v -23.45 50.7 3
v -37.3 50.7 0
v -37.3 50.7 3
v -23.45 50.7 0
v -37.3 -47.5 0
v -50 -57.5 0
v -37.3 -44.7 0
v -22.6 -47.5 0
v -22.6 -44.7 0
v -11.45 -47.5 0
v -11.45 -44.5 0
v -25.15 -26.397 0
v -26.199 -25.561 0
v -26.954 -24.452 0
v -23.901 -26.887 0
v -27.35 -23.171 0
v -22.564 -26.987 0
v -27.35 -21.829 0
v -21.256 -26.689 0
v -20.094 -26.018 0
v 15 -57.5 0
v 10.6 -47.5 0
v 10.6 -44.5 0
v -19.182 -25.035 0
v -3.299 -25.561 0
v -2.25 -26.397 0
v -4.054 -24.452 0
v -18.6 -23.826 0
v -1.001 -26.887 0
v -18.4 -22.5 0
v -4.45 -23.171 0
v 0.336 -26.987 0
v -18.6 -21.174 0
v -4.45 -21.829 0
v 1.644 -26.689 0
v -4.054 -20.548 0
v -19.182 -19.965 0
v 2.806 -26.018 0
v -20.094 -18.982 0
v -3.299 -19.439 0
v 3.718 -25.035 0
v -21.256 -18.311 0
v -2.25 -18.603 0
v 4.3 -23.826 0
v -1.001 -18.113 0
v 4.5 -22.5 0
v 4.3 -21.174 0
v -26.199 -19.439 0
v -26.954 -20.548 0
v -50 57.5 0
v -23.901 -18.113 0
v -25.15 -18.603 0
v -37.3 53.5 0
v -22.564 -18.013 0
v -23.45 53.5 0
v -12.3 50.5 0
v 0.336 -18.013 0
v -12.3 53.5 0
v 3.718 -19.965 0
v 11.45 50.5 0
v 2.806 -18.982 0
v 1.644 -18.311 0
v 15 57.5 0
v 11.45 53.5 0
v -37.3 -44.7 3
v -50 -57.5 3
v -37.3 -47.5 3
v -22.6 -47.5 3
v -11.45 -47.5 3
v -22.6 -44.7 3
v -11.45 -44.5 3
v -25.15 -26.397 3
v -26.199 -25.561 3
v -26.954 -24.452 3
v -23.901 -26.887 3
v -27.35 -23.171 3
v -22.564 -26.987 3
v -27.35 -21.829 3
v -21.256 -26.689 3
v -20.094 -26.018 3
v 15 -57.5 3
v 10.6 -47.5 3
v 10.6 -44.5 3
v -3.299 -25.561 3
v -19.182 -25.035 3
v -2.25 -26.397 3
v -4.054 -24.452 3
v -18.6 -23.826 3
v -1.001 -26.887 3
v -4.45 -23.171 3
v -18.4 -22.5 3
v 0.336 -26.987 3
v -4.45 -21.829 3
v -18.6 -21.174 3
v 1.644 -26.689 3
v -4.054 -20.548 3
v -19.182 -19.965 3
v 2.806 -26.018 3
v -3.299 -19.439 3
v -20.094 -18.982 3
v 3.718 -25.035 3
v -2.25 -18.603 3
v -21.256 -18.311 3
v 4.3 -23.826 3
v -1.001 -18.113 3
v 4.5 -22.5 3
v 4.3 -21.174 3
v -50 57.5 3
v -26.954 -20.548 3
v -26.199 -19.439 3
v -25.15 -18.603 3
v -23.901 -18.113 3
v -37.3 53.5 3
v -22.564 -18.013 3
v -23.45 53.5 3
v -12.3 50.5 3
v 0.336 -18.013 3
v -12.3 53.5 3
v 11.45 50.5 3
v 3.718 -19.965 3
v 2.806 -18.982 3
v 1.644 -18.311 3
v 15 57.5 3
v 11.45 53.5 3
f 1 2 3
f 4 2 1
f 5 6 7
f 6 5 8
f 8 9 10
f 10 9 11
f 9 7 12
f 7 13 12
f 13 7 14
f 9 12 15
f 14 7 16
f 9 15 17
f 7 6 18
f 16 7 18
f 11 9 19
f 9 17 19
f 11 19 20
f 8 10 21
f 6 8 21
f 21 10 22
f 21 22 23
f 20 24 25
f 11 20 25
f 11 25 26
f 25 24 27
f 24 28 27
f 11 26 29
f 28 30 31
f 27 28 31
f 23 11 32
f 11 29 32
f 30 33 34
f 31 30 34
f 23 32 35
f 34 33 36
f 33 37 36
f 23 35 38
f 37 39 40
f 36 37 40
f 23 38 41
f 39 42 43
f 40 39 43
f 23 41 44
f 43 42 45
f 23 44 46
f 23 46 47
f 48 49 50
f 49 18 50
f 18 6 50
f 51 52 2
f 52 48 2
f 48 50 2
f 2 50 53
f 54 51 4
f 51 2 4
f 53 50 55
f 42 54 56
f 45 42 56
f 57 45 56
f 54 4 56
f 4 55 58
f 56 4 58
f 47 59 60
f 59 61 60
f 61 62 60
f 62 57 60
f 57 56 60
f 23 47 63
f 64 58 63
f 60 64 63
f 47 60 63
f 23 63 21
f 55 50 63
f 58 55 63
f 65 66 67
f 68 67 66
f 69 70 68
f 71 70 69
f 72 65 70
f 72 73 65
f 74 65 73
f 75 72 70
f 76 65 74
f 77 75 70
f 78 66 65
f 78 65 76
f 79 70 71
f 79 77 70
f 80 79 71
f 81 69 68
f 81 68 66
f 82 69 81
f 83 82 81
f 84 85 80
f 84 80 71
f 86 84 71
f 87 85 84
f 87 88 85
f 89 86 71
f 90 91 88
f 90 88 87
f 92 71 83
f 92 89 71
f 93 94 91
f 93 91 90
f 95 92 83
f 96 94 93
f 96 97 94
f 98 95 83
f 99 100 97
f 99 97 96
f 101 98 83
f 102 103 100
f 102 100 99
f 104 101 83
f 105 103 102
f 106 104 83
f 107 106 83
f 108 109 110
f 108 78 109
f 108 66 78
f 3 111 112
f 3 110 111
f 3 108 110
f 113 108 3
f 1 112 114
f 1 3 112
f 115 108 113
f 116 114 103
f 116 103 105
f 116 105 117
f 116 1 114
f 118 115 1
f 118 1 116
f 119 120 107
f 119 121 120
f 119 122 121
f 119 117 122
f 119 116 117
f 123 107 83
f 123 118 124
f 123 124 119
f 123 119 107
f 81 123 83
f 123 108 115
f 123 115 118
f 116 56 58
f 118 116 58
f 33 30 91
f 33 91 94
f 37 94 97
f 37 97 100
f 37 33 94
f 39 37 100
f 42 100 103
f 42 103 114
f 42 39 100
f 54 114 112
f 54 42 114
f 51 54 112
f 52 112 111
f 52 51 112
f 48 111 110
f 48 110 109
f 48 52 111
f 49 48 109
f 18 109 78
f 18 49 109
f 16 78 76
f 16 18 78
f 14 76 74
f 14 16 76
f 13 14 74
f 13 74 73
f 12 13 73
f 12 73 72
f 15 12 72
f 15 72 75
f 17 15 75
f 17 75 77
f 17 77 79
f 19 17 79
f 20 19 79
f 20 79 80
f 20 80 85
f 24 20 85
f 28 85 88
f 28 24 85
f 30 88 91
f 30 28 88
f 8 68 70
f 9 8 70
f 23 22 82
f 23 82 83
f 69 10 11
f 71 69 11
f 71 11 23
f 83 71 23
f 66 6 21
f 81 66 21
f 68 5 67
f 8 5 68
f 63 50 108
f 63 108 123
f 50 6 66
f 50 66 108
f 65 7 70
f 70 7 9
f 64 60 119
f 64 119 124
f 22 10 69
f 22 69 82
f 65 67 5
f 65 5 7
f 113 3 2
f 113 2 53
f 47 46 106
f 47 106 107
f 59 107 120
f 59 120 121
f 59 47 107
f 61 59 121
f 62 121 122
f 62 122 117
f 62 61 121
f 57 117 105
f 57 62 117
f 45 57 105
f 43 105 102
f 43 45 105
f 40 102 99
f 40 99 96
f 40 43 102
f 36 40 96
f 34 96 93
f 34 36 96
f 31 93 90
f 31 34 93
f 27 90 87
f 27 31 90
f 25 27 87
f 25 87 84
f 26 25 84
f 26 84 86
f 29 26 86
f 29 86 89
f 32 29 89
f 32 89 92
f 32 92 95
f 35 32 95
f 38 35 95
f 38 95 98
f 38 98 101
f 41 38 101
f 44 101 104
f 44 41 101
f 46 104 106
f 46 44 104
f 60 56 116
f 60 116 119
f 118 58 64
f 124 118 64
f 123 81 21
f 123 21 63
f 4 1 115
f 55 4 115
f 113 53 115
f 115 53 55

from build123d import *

# Parameters (mm, degrees)
CROQUIS1_W              = 100
CROQUIS1_H              = 115
CROQUIS1_R              = 4.5
CROQUIS1_W_2            = 14.7
CROQUIS1_H_2            = 2.8
CROQUIS1_W_3            = 22.05
CROQUIS1_H_3            = 3
CROQUIS1_W_4            = 13.85
CROQUIS1_W_5            = 23.75
SALIENTE_EXTRUIR1_DEPTH = 3
CROQUIS2_W              = 35
CROQUIS2_H              = 115
CORTAR_EXTRUIR1_DEPTH   = 4


with BuildPart() as part:
    # Croquis1 → Saliente-Extruir1 (new body)
    with BuildSketch(Plane.XY):
        Rectangle(CROQUIS1_W, CROQUIS1_H)
        with Locations((0, -22.5)):
            Circle(CROQUIS1_R, mode=Mode.SUBTRACT)
        with Locations((-22.9, -22.5)):
            Circle(CROQUIS1_R, mode=Mode.SUBTRACT)
        with Locations((24.1, -22.5)):
            Circle(CROQUIS1_R, mode=Mode.SUBTRACT)
        with Locations((29.95, -46.1)):
            Rectangle(CROQUIS1_W_2, CROQUIS1_H_2, mode=Mode.SUBTRACT)
        with Locations((-29.95, -46.1)):
            Rectangle(CROQUIS1_W_2, CROQUIS1_H_2, mode=Mode.SUBTRACT)
        with Locations((-0.425, -46)):
            Rectangle(CROQUIS1_W_3, CROQUIS1_H_3, mode=Mode.SUBTRACT)
        with Locations((30.375, 52.1)):
            Rectangle(CROQUIS1_W_4, CROQUIS1_H_2, mode=Mode.SUBTRACT)
        with Locations((-30.375, 52.1)):
            Rectangle(CROQUIS1_W_4, CROQUIS1_H_2, mode=Mode.SUBTRACT)
        with Locations((-0.425, 52)):
            Rectangle(CROQUIS1_W_5, CROQUIS1_H_3, mode=Mode.SUBTRACT)
    extrude(amount=SALIENTE_EXTRUIR1_DEPTH)

    # Croquis2 → Cortar-Extruir1 (cut, through all)
    with BuildSketch(Plane.XY.offset(3)):
        with Locations((32.5, 0)):
            Rectangle(CROQUIS2_W, CROQUIS2_H)
    extrude(amount=-CORTAR_EXTRUIR1_DEPTH, mode=Mode.SUBTRACT)


solid = part.part
